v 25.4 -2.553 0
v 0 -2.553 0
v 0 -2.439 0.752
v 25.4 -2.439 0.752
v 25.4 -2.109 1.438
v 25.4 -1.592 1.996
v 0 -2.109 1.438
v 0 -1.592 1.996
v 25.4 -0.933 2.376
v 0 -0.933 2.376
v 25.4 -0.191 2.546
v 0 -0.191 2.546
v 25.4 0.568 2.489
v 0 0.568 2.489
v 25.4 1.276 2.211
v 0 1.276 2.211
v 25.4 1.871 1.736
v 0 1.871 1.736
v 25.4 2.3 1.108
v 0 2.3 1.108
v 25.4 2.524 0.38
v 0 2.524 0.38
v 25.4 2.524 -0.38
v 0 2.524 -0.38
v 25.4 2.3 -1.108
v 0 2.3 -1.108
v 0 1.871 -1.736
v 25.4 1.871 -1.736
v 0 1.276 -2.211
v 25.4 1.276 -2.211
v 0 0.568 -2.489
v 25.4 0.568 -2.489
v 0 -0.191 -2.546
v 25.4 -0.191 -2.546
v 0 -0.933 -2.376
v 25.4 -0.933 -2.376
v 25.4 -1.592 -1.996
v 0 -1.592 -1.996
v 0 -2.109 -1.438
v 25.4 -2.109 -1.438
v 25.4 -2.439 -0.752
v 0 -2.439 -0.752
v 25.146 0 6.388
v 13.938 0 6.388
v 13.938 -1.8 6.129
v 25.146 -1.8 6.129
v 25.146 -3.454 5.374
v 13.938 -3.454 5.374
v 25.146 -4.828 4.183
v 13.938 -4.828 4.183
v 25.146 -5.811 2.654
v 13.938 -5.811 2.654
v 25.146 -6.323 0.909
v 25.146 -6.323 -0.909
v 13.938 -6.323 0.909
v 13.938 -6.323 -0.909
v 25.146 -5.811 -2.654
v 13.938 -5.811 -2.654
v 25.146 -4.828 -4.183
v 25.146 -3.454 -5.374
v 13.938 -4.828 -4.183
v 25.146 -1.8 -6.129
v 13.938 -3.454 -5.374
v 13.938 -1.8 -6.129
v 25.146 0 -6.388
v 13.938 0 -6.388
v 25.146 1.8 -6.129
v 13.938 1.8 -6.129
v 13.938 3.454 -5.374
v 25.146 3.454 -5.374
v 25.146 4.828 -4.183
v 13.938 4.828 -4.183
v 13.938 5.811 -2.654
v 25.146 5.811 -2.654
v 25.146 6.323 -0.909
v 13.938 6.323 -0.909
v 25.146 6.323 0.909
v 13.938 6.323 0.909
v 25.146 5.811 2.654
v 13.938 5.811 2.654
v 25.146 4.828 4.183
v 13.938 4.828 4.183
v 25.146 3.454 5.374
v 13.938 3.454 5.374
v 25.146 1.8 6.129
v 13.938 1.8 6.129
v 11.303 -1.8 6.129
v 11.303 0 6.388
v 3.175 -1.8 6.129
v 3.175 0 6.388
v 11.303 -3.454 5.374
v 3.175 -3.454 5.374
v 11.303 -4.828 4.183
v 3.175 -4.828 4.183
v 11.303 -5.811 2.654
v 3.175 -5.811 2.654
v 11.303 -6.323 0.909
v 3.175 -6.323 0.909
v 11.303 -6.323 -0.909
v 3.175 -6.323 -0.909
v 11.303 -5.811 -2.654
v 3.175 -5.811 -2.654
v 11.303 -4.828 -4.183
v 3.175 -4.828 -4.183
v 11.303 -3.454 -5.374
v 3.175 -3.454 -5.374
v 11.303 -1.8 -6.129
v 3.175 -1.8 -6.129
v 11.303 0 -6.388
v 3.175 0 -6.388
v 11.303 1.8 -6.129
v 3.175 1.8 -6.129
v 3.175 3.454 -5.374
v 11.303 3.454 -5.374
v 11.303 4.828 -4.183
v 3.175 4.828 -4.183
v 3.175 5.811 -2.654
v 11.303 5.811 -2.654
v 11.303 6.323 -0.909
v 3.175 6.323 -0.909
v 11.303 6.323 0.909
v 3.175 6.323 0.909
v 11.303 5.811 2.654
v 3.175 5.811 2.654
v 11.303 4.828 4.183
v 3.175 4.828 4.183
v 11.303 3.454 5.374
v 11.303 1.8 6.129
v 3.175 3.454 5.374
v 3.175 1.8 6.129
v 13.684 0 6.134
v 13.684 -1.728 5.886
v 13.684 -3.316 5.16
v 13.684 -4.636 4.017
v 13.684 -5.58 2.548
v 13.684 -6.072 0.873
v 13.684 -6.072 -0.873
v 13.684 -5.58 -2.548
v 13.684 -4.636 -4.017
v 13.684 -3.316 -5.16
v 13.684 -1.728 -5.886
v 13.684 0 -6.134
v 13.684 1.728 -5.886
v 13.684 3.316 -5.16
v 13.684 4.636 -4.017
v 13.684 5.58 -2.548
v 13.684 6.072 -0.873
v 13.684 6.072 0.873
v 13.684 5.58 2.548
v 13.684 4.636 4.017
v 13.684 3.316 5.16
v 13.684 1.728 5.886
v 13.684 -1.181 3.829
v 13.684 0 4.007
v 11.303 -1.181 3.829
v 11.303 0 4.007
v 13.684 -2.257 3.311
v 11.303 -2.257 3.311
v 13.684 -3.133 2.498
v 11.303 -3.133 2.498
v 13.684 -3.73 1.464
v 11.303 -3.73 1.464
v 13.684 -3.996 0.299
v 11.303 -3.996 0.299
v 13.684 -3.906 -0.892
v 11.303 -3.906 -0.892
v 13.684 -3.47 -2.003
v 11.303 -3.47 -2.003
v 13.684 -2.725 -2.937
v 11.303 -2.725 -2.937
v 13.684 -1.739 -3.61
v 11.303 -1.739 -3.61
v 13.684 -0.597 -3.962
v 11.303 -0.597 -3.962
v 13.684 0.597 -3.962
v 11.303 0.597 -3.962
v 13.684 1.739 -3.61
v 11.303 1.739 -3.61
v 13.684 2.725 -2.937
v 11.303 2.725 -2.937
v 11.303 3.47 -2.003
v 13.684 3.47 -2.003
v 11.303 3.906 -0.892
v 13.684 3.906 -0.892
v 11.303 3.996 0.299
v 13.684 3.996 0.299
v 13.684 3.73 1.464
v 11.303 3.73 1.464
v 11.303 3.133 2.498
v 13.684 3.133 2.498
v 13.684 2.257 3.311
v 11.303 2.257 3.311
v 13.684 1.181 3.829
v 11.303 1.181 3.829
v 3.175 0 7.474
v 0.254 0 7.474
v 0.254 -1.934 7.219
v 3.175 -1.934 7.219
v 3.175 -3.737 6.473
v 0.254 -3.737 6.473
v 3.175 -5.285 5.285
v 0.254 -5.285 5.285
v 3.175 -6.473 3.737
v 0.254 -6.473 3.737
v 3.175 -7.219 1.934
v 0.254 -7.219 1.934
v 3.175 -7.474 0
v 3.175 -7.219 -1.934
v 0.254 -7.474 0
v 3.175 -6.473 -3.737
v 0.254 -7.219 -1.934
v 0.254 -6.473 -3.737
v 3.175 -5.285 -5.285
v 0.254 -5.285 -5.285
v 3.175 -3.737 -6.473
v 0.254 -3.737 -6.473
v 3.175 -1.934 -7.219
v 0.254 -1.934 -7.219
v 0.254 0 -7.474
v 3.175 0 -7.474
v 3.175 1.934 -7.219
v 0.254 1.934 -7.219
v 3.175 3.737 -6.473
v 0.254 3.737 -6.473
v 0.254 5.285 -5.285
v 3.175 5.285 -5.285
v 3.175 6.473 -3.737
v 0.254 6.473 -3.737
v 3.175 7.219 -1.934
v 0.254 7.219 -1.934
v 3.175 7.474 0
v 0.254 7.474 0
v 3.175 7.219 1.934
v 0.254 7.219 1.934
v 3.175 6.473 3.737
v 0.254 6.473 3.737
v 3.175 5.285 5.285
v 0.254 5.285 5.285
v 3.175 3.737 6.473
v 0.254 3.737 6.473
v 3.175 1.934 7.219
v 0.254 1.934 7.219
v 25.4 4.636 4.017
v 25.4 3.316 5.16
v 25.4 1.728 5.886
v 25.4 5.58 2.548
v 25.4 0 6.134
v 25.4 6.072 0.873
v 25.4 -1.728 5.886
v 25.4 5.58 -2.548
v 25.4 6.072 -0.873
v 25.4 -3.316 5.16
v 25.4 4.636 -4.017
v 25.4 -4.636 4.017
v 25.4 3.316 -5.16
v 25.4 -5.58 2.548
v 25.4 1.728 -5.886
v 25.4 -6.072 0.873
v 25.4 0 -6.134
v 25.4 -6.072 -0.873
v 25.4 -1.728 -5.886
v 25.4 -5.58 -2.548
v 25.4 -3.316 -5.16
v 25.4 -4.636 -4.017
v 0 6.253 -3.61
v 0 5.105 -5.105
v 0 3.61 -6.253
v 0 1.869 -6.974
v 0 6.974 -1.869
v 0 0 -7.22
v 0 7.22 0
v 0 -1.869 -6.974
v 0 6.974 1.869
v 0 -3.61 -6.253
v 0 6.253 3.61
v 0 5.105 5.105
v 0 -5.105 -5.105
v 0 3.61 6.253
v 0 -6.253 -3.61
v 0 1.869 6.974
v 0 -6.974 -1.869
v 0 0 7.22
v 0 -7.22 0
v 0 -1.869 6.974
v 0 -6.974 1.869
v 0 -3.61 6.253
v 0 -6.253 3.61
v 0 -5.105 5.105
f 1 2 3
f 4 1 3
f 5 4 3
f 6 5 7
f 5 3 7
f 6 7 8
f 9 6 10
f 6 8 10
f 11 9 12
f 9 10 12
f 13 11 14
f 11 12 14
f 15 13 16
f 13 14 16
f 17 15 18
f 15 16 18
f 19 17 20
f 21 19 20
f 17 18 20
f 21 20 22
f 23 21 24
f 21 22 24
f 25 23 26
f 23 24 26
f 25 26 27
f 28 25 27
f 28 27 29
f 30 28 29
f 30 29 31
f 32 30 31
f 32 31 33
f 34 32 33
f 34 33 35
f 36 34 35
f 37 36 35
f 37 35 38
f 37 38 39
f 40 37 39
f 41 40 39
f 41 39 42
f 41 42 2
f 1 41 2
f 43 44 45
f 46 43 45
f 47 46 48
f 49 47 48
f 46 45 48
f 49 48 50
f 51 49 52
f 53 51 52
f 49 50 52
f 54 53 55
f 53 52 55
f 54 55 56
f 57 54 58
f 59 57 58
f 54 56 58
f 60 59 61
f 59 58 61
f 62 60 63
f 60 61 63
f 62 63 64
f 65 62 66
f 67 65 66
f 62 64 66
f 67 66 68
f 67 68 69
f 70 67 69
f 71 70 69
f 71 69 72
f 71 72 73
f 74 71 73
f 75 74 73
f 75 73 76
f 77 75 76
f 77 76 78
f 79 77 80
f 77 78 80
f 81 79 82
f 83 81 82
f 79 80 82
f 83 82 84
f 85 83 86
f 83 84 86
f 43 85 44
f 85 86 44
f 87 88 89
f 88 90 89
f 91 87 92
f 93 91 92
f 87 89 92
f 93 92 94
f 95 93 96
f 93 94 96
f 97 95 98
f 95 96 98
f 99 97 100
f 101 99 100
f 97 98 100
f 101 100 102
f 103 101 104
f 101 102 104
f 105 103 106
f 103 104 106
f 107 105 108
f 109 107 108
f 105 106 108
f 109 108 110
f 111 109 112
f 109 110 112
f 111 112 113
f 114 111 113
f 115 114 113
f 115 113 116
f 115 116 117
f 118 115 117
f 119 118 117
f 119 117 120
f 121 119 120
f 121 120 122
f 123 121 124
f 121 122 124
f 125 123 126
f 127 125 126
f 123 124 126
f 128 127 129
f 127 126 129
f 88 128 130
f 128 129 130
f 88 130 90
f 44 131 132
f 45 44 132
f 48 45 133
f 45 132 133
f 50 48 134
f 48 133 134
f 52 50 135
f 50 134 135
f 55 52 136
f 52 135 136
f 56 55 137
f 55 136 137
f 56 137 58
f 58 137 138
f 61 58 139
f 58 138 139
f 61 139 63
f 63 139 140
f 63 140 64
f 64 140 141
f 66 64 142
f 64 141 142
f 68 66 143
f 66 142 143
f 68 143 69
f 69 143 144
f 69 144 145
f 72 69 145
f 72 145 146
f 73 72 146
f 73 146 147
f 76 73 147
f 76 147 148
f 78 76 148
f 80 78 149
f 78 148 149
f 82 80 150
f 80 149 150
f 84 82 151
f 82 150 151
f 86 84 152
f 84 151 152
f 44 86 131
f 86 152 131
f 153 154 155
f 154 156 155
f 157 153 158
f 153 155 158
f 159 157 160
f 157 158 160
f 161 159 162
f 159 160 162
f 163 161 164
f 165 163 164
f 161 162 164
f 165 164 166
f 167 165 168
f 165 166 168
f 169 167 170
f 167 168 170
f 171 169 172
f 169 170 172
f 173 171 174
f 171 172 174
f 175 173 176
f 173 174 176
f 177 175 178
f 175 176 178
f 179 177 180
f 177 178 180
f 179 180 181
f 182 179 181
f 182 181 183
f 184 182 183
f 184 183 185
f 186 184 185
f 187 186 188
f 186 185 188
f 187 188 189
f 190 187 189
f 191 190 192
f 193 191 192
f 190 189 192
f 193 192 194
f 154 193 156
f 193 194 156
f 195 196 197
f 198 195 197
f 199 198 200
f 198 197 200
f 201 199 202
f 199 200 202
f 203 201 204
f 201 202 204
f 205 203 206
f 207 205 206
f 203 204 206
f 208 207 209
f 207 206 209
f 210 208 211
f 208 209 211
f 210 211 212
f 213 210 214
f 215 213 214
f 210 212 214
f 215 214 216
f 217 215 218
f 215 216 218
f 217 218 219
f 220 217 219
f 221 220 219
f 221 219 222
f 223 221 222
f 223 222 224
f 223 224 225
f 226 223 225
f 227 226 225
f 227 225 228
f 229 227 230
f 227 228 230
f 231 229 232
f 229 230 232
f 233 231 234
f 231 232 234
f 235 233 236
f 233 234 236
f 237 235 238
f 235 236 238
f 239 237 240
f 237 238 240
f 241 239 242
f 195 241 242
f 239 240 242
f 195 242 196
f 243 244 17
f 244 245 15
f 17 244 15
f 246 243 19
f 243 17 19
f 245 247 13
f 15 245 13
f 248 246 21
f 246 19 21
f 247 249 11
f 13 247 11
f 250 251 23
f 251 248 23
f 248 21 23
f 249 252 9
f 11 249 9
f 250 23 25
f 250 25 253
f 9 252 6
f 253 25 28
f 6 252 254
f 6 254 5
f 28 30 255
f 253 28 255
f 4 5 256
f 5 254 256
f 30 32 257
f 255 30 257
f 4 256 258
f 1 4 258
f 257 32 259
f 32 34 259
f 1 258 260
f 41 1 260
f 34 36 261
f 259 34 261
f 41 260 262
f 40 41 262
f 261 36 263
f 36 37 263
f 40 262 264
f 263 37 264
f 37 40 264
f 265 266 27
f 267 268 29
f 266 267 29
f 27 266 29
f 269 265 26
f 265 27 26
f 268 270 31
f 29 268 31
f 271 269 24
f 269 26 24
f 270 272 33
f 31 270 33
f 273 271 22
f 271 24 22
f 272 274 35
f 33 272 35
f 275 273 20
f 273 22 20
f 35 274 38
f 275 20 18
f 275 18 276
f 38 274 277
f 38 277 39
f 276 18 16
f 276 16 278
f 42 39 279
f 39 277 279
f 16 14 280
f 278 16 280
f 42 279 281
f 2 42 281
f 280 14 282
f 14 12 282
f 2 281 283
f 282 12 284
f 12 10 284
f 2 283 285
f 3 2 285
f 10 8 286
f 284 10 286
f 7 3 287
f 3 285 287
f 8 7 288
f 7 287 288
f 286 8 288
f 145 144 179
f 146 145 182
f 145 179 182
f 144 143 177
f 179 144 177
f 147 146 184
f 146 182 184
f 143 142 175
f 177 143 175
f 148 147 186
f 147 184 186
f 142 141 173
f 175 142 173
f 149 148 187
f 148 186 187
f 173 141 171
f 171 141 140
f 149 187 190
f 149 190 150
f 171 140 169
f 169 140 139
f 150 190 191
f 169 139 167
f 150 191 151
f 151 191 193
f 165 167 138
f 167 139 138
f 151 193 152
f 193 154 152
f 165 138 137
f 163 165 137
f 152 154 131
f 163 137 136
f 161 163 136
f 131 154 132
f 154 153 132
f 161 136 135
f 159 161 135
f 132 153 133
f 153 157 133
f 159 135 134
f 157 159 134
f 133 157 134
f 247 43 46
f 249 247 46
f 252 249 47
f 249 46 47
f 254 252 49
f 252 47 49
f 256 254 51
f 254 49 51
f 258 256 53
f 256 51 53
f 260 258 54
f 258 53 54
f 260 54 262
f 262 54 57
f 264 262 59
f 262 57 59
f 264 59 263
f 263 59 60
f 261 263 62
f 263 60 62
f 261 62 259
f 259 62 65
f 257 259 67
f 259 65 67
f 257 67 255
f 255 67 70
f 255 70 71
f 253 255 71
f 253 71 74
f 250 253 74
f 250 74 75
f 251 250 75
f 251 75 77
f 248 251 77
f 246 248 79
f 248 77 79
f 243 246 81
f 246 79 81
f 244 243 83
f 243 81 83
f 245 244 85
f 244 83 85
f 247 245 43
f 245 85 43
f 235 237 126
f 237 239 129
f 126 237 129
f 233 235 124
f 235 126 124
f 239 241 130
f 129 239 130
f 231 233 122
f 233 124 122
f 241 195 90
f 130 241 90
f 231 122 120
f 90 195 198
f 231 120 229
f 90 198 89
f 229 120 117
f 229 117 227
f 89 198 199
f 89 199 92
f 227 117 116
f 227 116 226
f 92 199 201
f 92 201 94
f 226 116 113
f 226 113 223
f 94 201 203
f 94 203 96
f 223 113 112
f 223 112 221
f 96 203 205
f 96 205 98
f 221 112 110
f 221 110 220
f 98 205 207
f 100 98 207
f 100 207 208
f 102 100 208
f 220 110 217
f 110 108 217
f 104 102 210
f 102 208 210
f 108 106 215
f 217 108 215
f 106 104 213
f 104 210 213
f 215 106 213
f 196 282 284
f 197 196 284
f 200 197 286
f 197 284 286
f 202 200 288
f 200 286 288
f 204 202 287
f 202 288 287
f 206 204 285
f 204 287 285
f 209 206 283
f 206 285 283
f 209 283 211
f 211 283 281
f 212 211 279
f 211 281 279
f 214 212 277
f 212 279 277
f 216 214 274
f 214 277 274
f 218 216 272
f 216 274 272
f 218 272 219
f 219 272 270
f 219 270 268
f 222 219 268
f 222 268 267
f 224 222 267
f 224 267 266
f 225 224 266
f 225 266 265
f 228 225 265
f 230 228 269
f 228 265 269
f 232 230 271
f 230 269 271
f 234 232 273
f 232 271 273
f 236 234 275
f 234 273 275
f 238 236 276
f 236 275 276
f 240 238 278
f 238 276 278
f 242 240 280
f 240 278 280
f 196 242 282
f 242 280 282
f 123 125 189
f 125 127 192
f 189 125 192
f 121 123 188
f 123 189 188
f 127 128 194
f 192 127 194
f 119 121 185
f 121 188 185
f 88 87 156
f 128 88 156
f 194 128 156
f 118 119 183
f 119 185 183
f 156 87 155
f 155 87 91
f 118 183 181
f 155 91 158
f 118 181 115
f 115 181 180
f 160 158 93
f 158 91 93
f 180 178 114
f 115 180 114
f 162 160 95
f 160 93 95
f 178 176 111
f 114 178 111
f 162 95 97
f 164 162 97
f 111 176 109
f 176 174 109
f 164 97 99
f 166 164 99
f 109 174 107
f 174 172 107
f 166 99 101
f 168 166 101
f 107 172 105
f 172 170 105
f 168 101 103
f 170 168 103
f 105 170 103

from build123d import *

# Parameters (mm, degrees)
F2_SIZE = 0.254
F4_D    = 5.1054


with BuildPart() as f1:
    # F0 (on Front) → F1 (revolve)
    with BuildSketch(Plane.XZ):
        Polygon((11.303, 6.3881), (3.175, 6.3881), (3.175, 7.47395), (0, 7.47395), (0, 0), (22.86, 0), (25.4, 0), (25.4, 6.3881), (13.68425, 6.3881), (13.68425, 4.00685), (11.303, 4.00685), align=None)
    revolve(axis=Axis((11.43, 0, 0), (1, 0, 0)))

    # F2
    f2_edges = [f1.edges().sort_by_distance(p)[0] for p in [
        (0, 0, -7.47395),
        (25.4, 0, -6.3881),
        (13.68425, 0, -6.3881),
    ]]
    chamfer(f2_edges, length=F2_SIZE)

    # F4 (through all)
    with Locations(Plane.YZ.offset(25.4)):
        with Locations((0, 0)):
            Hole(F4_D / 2)


solid = f1.part
